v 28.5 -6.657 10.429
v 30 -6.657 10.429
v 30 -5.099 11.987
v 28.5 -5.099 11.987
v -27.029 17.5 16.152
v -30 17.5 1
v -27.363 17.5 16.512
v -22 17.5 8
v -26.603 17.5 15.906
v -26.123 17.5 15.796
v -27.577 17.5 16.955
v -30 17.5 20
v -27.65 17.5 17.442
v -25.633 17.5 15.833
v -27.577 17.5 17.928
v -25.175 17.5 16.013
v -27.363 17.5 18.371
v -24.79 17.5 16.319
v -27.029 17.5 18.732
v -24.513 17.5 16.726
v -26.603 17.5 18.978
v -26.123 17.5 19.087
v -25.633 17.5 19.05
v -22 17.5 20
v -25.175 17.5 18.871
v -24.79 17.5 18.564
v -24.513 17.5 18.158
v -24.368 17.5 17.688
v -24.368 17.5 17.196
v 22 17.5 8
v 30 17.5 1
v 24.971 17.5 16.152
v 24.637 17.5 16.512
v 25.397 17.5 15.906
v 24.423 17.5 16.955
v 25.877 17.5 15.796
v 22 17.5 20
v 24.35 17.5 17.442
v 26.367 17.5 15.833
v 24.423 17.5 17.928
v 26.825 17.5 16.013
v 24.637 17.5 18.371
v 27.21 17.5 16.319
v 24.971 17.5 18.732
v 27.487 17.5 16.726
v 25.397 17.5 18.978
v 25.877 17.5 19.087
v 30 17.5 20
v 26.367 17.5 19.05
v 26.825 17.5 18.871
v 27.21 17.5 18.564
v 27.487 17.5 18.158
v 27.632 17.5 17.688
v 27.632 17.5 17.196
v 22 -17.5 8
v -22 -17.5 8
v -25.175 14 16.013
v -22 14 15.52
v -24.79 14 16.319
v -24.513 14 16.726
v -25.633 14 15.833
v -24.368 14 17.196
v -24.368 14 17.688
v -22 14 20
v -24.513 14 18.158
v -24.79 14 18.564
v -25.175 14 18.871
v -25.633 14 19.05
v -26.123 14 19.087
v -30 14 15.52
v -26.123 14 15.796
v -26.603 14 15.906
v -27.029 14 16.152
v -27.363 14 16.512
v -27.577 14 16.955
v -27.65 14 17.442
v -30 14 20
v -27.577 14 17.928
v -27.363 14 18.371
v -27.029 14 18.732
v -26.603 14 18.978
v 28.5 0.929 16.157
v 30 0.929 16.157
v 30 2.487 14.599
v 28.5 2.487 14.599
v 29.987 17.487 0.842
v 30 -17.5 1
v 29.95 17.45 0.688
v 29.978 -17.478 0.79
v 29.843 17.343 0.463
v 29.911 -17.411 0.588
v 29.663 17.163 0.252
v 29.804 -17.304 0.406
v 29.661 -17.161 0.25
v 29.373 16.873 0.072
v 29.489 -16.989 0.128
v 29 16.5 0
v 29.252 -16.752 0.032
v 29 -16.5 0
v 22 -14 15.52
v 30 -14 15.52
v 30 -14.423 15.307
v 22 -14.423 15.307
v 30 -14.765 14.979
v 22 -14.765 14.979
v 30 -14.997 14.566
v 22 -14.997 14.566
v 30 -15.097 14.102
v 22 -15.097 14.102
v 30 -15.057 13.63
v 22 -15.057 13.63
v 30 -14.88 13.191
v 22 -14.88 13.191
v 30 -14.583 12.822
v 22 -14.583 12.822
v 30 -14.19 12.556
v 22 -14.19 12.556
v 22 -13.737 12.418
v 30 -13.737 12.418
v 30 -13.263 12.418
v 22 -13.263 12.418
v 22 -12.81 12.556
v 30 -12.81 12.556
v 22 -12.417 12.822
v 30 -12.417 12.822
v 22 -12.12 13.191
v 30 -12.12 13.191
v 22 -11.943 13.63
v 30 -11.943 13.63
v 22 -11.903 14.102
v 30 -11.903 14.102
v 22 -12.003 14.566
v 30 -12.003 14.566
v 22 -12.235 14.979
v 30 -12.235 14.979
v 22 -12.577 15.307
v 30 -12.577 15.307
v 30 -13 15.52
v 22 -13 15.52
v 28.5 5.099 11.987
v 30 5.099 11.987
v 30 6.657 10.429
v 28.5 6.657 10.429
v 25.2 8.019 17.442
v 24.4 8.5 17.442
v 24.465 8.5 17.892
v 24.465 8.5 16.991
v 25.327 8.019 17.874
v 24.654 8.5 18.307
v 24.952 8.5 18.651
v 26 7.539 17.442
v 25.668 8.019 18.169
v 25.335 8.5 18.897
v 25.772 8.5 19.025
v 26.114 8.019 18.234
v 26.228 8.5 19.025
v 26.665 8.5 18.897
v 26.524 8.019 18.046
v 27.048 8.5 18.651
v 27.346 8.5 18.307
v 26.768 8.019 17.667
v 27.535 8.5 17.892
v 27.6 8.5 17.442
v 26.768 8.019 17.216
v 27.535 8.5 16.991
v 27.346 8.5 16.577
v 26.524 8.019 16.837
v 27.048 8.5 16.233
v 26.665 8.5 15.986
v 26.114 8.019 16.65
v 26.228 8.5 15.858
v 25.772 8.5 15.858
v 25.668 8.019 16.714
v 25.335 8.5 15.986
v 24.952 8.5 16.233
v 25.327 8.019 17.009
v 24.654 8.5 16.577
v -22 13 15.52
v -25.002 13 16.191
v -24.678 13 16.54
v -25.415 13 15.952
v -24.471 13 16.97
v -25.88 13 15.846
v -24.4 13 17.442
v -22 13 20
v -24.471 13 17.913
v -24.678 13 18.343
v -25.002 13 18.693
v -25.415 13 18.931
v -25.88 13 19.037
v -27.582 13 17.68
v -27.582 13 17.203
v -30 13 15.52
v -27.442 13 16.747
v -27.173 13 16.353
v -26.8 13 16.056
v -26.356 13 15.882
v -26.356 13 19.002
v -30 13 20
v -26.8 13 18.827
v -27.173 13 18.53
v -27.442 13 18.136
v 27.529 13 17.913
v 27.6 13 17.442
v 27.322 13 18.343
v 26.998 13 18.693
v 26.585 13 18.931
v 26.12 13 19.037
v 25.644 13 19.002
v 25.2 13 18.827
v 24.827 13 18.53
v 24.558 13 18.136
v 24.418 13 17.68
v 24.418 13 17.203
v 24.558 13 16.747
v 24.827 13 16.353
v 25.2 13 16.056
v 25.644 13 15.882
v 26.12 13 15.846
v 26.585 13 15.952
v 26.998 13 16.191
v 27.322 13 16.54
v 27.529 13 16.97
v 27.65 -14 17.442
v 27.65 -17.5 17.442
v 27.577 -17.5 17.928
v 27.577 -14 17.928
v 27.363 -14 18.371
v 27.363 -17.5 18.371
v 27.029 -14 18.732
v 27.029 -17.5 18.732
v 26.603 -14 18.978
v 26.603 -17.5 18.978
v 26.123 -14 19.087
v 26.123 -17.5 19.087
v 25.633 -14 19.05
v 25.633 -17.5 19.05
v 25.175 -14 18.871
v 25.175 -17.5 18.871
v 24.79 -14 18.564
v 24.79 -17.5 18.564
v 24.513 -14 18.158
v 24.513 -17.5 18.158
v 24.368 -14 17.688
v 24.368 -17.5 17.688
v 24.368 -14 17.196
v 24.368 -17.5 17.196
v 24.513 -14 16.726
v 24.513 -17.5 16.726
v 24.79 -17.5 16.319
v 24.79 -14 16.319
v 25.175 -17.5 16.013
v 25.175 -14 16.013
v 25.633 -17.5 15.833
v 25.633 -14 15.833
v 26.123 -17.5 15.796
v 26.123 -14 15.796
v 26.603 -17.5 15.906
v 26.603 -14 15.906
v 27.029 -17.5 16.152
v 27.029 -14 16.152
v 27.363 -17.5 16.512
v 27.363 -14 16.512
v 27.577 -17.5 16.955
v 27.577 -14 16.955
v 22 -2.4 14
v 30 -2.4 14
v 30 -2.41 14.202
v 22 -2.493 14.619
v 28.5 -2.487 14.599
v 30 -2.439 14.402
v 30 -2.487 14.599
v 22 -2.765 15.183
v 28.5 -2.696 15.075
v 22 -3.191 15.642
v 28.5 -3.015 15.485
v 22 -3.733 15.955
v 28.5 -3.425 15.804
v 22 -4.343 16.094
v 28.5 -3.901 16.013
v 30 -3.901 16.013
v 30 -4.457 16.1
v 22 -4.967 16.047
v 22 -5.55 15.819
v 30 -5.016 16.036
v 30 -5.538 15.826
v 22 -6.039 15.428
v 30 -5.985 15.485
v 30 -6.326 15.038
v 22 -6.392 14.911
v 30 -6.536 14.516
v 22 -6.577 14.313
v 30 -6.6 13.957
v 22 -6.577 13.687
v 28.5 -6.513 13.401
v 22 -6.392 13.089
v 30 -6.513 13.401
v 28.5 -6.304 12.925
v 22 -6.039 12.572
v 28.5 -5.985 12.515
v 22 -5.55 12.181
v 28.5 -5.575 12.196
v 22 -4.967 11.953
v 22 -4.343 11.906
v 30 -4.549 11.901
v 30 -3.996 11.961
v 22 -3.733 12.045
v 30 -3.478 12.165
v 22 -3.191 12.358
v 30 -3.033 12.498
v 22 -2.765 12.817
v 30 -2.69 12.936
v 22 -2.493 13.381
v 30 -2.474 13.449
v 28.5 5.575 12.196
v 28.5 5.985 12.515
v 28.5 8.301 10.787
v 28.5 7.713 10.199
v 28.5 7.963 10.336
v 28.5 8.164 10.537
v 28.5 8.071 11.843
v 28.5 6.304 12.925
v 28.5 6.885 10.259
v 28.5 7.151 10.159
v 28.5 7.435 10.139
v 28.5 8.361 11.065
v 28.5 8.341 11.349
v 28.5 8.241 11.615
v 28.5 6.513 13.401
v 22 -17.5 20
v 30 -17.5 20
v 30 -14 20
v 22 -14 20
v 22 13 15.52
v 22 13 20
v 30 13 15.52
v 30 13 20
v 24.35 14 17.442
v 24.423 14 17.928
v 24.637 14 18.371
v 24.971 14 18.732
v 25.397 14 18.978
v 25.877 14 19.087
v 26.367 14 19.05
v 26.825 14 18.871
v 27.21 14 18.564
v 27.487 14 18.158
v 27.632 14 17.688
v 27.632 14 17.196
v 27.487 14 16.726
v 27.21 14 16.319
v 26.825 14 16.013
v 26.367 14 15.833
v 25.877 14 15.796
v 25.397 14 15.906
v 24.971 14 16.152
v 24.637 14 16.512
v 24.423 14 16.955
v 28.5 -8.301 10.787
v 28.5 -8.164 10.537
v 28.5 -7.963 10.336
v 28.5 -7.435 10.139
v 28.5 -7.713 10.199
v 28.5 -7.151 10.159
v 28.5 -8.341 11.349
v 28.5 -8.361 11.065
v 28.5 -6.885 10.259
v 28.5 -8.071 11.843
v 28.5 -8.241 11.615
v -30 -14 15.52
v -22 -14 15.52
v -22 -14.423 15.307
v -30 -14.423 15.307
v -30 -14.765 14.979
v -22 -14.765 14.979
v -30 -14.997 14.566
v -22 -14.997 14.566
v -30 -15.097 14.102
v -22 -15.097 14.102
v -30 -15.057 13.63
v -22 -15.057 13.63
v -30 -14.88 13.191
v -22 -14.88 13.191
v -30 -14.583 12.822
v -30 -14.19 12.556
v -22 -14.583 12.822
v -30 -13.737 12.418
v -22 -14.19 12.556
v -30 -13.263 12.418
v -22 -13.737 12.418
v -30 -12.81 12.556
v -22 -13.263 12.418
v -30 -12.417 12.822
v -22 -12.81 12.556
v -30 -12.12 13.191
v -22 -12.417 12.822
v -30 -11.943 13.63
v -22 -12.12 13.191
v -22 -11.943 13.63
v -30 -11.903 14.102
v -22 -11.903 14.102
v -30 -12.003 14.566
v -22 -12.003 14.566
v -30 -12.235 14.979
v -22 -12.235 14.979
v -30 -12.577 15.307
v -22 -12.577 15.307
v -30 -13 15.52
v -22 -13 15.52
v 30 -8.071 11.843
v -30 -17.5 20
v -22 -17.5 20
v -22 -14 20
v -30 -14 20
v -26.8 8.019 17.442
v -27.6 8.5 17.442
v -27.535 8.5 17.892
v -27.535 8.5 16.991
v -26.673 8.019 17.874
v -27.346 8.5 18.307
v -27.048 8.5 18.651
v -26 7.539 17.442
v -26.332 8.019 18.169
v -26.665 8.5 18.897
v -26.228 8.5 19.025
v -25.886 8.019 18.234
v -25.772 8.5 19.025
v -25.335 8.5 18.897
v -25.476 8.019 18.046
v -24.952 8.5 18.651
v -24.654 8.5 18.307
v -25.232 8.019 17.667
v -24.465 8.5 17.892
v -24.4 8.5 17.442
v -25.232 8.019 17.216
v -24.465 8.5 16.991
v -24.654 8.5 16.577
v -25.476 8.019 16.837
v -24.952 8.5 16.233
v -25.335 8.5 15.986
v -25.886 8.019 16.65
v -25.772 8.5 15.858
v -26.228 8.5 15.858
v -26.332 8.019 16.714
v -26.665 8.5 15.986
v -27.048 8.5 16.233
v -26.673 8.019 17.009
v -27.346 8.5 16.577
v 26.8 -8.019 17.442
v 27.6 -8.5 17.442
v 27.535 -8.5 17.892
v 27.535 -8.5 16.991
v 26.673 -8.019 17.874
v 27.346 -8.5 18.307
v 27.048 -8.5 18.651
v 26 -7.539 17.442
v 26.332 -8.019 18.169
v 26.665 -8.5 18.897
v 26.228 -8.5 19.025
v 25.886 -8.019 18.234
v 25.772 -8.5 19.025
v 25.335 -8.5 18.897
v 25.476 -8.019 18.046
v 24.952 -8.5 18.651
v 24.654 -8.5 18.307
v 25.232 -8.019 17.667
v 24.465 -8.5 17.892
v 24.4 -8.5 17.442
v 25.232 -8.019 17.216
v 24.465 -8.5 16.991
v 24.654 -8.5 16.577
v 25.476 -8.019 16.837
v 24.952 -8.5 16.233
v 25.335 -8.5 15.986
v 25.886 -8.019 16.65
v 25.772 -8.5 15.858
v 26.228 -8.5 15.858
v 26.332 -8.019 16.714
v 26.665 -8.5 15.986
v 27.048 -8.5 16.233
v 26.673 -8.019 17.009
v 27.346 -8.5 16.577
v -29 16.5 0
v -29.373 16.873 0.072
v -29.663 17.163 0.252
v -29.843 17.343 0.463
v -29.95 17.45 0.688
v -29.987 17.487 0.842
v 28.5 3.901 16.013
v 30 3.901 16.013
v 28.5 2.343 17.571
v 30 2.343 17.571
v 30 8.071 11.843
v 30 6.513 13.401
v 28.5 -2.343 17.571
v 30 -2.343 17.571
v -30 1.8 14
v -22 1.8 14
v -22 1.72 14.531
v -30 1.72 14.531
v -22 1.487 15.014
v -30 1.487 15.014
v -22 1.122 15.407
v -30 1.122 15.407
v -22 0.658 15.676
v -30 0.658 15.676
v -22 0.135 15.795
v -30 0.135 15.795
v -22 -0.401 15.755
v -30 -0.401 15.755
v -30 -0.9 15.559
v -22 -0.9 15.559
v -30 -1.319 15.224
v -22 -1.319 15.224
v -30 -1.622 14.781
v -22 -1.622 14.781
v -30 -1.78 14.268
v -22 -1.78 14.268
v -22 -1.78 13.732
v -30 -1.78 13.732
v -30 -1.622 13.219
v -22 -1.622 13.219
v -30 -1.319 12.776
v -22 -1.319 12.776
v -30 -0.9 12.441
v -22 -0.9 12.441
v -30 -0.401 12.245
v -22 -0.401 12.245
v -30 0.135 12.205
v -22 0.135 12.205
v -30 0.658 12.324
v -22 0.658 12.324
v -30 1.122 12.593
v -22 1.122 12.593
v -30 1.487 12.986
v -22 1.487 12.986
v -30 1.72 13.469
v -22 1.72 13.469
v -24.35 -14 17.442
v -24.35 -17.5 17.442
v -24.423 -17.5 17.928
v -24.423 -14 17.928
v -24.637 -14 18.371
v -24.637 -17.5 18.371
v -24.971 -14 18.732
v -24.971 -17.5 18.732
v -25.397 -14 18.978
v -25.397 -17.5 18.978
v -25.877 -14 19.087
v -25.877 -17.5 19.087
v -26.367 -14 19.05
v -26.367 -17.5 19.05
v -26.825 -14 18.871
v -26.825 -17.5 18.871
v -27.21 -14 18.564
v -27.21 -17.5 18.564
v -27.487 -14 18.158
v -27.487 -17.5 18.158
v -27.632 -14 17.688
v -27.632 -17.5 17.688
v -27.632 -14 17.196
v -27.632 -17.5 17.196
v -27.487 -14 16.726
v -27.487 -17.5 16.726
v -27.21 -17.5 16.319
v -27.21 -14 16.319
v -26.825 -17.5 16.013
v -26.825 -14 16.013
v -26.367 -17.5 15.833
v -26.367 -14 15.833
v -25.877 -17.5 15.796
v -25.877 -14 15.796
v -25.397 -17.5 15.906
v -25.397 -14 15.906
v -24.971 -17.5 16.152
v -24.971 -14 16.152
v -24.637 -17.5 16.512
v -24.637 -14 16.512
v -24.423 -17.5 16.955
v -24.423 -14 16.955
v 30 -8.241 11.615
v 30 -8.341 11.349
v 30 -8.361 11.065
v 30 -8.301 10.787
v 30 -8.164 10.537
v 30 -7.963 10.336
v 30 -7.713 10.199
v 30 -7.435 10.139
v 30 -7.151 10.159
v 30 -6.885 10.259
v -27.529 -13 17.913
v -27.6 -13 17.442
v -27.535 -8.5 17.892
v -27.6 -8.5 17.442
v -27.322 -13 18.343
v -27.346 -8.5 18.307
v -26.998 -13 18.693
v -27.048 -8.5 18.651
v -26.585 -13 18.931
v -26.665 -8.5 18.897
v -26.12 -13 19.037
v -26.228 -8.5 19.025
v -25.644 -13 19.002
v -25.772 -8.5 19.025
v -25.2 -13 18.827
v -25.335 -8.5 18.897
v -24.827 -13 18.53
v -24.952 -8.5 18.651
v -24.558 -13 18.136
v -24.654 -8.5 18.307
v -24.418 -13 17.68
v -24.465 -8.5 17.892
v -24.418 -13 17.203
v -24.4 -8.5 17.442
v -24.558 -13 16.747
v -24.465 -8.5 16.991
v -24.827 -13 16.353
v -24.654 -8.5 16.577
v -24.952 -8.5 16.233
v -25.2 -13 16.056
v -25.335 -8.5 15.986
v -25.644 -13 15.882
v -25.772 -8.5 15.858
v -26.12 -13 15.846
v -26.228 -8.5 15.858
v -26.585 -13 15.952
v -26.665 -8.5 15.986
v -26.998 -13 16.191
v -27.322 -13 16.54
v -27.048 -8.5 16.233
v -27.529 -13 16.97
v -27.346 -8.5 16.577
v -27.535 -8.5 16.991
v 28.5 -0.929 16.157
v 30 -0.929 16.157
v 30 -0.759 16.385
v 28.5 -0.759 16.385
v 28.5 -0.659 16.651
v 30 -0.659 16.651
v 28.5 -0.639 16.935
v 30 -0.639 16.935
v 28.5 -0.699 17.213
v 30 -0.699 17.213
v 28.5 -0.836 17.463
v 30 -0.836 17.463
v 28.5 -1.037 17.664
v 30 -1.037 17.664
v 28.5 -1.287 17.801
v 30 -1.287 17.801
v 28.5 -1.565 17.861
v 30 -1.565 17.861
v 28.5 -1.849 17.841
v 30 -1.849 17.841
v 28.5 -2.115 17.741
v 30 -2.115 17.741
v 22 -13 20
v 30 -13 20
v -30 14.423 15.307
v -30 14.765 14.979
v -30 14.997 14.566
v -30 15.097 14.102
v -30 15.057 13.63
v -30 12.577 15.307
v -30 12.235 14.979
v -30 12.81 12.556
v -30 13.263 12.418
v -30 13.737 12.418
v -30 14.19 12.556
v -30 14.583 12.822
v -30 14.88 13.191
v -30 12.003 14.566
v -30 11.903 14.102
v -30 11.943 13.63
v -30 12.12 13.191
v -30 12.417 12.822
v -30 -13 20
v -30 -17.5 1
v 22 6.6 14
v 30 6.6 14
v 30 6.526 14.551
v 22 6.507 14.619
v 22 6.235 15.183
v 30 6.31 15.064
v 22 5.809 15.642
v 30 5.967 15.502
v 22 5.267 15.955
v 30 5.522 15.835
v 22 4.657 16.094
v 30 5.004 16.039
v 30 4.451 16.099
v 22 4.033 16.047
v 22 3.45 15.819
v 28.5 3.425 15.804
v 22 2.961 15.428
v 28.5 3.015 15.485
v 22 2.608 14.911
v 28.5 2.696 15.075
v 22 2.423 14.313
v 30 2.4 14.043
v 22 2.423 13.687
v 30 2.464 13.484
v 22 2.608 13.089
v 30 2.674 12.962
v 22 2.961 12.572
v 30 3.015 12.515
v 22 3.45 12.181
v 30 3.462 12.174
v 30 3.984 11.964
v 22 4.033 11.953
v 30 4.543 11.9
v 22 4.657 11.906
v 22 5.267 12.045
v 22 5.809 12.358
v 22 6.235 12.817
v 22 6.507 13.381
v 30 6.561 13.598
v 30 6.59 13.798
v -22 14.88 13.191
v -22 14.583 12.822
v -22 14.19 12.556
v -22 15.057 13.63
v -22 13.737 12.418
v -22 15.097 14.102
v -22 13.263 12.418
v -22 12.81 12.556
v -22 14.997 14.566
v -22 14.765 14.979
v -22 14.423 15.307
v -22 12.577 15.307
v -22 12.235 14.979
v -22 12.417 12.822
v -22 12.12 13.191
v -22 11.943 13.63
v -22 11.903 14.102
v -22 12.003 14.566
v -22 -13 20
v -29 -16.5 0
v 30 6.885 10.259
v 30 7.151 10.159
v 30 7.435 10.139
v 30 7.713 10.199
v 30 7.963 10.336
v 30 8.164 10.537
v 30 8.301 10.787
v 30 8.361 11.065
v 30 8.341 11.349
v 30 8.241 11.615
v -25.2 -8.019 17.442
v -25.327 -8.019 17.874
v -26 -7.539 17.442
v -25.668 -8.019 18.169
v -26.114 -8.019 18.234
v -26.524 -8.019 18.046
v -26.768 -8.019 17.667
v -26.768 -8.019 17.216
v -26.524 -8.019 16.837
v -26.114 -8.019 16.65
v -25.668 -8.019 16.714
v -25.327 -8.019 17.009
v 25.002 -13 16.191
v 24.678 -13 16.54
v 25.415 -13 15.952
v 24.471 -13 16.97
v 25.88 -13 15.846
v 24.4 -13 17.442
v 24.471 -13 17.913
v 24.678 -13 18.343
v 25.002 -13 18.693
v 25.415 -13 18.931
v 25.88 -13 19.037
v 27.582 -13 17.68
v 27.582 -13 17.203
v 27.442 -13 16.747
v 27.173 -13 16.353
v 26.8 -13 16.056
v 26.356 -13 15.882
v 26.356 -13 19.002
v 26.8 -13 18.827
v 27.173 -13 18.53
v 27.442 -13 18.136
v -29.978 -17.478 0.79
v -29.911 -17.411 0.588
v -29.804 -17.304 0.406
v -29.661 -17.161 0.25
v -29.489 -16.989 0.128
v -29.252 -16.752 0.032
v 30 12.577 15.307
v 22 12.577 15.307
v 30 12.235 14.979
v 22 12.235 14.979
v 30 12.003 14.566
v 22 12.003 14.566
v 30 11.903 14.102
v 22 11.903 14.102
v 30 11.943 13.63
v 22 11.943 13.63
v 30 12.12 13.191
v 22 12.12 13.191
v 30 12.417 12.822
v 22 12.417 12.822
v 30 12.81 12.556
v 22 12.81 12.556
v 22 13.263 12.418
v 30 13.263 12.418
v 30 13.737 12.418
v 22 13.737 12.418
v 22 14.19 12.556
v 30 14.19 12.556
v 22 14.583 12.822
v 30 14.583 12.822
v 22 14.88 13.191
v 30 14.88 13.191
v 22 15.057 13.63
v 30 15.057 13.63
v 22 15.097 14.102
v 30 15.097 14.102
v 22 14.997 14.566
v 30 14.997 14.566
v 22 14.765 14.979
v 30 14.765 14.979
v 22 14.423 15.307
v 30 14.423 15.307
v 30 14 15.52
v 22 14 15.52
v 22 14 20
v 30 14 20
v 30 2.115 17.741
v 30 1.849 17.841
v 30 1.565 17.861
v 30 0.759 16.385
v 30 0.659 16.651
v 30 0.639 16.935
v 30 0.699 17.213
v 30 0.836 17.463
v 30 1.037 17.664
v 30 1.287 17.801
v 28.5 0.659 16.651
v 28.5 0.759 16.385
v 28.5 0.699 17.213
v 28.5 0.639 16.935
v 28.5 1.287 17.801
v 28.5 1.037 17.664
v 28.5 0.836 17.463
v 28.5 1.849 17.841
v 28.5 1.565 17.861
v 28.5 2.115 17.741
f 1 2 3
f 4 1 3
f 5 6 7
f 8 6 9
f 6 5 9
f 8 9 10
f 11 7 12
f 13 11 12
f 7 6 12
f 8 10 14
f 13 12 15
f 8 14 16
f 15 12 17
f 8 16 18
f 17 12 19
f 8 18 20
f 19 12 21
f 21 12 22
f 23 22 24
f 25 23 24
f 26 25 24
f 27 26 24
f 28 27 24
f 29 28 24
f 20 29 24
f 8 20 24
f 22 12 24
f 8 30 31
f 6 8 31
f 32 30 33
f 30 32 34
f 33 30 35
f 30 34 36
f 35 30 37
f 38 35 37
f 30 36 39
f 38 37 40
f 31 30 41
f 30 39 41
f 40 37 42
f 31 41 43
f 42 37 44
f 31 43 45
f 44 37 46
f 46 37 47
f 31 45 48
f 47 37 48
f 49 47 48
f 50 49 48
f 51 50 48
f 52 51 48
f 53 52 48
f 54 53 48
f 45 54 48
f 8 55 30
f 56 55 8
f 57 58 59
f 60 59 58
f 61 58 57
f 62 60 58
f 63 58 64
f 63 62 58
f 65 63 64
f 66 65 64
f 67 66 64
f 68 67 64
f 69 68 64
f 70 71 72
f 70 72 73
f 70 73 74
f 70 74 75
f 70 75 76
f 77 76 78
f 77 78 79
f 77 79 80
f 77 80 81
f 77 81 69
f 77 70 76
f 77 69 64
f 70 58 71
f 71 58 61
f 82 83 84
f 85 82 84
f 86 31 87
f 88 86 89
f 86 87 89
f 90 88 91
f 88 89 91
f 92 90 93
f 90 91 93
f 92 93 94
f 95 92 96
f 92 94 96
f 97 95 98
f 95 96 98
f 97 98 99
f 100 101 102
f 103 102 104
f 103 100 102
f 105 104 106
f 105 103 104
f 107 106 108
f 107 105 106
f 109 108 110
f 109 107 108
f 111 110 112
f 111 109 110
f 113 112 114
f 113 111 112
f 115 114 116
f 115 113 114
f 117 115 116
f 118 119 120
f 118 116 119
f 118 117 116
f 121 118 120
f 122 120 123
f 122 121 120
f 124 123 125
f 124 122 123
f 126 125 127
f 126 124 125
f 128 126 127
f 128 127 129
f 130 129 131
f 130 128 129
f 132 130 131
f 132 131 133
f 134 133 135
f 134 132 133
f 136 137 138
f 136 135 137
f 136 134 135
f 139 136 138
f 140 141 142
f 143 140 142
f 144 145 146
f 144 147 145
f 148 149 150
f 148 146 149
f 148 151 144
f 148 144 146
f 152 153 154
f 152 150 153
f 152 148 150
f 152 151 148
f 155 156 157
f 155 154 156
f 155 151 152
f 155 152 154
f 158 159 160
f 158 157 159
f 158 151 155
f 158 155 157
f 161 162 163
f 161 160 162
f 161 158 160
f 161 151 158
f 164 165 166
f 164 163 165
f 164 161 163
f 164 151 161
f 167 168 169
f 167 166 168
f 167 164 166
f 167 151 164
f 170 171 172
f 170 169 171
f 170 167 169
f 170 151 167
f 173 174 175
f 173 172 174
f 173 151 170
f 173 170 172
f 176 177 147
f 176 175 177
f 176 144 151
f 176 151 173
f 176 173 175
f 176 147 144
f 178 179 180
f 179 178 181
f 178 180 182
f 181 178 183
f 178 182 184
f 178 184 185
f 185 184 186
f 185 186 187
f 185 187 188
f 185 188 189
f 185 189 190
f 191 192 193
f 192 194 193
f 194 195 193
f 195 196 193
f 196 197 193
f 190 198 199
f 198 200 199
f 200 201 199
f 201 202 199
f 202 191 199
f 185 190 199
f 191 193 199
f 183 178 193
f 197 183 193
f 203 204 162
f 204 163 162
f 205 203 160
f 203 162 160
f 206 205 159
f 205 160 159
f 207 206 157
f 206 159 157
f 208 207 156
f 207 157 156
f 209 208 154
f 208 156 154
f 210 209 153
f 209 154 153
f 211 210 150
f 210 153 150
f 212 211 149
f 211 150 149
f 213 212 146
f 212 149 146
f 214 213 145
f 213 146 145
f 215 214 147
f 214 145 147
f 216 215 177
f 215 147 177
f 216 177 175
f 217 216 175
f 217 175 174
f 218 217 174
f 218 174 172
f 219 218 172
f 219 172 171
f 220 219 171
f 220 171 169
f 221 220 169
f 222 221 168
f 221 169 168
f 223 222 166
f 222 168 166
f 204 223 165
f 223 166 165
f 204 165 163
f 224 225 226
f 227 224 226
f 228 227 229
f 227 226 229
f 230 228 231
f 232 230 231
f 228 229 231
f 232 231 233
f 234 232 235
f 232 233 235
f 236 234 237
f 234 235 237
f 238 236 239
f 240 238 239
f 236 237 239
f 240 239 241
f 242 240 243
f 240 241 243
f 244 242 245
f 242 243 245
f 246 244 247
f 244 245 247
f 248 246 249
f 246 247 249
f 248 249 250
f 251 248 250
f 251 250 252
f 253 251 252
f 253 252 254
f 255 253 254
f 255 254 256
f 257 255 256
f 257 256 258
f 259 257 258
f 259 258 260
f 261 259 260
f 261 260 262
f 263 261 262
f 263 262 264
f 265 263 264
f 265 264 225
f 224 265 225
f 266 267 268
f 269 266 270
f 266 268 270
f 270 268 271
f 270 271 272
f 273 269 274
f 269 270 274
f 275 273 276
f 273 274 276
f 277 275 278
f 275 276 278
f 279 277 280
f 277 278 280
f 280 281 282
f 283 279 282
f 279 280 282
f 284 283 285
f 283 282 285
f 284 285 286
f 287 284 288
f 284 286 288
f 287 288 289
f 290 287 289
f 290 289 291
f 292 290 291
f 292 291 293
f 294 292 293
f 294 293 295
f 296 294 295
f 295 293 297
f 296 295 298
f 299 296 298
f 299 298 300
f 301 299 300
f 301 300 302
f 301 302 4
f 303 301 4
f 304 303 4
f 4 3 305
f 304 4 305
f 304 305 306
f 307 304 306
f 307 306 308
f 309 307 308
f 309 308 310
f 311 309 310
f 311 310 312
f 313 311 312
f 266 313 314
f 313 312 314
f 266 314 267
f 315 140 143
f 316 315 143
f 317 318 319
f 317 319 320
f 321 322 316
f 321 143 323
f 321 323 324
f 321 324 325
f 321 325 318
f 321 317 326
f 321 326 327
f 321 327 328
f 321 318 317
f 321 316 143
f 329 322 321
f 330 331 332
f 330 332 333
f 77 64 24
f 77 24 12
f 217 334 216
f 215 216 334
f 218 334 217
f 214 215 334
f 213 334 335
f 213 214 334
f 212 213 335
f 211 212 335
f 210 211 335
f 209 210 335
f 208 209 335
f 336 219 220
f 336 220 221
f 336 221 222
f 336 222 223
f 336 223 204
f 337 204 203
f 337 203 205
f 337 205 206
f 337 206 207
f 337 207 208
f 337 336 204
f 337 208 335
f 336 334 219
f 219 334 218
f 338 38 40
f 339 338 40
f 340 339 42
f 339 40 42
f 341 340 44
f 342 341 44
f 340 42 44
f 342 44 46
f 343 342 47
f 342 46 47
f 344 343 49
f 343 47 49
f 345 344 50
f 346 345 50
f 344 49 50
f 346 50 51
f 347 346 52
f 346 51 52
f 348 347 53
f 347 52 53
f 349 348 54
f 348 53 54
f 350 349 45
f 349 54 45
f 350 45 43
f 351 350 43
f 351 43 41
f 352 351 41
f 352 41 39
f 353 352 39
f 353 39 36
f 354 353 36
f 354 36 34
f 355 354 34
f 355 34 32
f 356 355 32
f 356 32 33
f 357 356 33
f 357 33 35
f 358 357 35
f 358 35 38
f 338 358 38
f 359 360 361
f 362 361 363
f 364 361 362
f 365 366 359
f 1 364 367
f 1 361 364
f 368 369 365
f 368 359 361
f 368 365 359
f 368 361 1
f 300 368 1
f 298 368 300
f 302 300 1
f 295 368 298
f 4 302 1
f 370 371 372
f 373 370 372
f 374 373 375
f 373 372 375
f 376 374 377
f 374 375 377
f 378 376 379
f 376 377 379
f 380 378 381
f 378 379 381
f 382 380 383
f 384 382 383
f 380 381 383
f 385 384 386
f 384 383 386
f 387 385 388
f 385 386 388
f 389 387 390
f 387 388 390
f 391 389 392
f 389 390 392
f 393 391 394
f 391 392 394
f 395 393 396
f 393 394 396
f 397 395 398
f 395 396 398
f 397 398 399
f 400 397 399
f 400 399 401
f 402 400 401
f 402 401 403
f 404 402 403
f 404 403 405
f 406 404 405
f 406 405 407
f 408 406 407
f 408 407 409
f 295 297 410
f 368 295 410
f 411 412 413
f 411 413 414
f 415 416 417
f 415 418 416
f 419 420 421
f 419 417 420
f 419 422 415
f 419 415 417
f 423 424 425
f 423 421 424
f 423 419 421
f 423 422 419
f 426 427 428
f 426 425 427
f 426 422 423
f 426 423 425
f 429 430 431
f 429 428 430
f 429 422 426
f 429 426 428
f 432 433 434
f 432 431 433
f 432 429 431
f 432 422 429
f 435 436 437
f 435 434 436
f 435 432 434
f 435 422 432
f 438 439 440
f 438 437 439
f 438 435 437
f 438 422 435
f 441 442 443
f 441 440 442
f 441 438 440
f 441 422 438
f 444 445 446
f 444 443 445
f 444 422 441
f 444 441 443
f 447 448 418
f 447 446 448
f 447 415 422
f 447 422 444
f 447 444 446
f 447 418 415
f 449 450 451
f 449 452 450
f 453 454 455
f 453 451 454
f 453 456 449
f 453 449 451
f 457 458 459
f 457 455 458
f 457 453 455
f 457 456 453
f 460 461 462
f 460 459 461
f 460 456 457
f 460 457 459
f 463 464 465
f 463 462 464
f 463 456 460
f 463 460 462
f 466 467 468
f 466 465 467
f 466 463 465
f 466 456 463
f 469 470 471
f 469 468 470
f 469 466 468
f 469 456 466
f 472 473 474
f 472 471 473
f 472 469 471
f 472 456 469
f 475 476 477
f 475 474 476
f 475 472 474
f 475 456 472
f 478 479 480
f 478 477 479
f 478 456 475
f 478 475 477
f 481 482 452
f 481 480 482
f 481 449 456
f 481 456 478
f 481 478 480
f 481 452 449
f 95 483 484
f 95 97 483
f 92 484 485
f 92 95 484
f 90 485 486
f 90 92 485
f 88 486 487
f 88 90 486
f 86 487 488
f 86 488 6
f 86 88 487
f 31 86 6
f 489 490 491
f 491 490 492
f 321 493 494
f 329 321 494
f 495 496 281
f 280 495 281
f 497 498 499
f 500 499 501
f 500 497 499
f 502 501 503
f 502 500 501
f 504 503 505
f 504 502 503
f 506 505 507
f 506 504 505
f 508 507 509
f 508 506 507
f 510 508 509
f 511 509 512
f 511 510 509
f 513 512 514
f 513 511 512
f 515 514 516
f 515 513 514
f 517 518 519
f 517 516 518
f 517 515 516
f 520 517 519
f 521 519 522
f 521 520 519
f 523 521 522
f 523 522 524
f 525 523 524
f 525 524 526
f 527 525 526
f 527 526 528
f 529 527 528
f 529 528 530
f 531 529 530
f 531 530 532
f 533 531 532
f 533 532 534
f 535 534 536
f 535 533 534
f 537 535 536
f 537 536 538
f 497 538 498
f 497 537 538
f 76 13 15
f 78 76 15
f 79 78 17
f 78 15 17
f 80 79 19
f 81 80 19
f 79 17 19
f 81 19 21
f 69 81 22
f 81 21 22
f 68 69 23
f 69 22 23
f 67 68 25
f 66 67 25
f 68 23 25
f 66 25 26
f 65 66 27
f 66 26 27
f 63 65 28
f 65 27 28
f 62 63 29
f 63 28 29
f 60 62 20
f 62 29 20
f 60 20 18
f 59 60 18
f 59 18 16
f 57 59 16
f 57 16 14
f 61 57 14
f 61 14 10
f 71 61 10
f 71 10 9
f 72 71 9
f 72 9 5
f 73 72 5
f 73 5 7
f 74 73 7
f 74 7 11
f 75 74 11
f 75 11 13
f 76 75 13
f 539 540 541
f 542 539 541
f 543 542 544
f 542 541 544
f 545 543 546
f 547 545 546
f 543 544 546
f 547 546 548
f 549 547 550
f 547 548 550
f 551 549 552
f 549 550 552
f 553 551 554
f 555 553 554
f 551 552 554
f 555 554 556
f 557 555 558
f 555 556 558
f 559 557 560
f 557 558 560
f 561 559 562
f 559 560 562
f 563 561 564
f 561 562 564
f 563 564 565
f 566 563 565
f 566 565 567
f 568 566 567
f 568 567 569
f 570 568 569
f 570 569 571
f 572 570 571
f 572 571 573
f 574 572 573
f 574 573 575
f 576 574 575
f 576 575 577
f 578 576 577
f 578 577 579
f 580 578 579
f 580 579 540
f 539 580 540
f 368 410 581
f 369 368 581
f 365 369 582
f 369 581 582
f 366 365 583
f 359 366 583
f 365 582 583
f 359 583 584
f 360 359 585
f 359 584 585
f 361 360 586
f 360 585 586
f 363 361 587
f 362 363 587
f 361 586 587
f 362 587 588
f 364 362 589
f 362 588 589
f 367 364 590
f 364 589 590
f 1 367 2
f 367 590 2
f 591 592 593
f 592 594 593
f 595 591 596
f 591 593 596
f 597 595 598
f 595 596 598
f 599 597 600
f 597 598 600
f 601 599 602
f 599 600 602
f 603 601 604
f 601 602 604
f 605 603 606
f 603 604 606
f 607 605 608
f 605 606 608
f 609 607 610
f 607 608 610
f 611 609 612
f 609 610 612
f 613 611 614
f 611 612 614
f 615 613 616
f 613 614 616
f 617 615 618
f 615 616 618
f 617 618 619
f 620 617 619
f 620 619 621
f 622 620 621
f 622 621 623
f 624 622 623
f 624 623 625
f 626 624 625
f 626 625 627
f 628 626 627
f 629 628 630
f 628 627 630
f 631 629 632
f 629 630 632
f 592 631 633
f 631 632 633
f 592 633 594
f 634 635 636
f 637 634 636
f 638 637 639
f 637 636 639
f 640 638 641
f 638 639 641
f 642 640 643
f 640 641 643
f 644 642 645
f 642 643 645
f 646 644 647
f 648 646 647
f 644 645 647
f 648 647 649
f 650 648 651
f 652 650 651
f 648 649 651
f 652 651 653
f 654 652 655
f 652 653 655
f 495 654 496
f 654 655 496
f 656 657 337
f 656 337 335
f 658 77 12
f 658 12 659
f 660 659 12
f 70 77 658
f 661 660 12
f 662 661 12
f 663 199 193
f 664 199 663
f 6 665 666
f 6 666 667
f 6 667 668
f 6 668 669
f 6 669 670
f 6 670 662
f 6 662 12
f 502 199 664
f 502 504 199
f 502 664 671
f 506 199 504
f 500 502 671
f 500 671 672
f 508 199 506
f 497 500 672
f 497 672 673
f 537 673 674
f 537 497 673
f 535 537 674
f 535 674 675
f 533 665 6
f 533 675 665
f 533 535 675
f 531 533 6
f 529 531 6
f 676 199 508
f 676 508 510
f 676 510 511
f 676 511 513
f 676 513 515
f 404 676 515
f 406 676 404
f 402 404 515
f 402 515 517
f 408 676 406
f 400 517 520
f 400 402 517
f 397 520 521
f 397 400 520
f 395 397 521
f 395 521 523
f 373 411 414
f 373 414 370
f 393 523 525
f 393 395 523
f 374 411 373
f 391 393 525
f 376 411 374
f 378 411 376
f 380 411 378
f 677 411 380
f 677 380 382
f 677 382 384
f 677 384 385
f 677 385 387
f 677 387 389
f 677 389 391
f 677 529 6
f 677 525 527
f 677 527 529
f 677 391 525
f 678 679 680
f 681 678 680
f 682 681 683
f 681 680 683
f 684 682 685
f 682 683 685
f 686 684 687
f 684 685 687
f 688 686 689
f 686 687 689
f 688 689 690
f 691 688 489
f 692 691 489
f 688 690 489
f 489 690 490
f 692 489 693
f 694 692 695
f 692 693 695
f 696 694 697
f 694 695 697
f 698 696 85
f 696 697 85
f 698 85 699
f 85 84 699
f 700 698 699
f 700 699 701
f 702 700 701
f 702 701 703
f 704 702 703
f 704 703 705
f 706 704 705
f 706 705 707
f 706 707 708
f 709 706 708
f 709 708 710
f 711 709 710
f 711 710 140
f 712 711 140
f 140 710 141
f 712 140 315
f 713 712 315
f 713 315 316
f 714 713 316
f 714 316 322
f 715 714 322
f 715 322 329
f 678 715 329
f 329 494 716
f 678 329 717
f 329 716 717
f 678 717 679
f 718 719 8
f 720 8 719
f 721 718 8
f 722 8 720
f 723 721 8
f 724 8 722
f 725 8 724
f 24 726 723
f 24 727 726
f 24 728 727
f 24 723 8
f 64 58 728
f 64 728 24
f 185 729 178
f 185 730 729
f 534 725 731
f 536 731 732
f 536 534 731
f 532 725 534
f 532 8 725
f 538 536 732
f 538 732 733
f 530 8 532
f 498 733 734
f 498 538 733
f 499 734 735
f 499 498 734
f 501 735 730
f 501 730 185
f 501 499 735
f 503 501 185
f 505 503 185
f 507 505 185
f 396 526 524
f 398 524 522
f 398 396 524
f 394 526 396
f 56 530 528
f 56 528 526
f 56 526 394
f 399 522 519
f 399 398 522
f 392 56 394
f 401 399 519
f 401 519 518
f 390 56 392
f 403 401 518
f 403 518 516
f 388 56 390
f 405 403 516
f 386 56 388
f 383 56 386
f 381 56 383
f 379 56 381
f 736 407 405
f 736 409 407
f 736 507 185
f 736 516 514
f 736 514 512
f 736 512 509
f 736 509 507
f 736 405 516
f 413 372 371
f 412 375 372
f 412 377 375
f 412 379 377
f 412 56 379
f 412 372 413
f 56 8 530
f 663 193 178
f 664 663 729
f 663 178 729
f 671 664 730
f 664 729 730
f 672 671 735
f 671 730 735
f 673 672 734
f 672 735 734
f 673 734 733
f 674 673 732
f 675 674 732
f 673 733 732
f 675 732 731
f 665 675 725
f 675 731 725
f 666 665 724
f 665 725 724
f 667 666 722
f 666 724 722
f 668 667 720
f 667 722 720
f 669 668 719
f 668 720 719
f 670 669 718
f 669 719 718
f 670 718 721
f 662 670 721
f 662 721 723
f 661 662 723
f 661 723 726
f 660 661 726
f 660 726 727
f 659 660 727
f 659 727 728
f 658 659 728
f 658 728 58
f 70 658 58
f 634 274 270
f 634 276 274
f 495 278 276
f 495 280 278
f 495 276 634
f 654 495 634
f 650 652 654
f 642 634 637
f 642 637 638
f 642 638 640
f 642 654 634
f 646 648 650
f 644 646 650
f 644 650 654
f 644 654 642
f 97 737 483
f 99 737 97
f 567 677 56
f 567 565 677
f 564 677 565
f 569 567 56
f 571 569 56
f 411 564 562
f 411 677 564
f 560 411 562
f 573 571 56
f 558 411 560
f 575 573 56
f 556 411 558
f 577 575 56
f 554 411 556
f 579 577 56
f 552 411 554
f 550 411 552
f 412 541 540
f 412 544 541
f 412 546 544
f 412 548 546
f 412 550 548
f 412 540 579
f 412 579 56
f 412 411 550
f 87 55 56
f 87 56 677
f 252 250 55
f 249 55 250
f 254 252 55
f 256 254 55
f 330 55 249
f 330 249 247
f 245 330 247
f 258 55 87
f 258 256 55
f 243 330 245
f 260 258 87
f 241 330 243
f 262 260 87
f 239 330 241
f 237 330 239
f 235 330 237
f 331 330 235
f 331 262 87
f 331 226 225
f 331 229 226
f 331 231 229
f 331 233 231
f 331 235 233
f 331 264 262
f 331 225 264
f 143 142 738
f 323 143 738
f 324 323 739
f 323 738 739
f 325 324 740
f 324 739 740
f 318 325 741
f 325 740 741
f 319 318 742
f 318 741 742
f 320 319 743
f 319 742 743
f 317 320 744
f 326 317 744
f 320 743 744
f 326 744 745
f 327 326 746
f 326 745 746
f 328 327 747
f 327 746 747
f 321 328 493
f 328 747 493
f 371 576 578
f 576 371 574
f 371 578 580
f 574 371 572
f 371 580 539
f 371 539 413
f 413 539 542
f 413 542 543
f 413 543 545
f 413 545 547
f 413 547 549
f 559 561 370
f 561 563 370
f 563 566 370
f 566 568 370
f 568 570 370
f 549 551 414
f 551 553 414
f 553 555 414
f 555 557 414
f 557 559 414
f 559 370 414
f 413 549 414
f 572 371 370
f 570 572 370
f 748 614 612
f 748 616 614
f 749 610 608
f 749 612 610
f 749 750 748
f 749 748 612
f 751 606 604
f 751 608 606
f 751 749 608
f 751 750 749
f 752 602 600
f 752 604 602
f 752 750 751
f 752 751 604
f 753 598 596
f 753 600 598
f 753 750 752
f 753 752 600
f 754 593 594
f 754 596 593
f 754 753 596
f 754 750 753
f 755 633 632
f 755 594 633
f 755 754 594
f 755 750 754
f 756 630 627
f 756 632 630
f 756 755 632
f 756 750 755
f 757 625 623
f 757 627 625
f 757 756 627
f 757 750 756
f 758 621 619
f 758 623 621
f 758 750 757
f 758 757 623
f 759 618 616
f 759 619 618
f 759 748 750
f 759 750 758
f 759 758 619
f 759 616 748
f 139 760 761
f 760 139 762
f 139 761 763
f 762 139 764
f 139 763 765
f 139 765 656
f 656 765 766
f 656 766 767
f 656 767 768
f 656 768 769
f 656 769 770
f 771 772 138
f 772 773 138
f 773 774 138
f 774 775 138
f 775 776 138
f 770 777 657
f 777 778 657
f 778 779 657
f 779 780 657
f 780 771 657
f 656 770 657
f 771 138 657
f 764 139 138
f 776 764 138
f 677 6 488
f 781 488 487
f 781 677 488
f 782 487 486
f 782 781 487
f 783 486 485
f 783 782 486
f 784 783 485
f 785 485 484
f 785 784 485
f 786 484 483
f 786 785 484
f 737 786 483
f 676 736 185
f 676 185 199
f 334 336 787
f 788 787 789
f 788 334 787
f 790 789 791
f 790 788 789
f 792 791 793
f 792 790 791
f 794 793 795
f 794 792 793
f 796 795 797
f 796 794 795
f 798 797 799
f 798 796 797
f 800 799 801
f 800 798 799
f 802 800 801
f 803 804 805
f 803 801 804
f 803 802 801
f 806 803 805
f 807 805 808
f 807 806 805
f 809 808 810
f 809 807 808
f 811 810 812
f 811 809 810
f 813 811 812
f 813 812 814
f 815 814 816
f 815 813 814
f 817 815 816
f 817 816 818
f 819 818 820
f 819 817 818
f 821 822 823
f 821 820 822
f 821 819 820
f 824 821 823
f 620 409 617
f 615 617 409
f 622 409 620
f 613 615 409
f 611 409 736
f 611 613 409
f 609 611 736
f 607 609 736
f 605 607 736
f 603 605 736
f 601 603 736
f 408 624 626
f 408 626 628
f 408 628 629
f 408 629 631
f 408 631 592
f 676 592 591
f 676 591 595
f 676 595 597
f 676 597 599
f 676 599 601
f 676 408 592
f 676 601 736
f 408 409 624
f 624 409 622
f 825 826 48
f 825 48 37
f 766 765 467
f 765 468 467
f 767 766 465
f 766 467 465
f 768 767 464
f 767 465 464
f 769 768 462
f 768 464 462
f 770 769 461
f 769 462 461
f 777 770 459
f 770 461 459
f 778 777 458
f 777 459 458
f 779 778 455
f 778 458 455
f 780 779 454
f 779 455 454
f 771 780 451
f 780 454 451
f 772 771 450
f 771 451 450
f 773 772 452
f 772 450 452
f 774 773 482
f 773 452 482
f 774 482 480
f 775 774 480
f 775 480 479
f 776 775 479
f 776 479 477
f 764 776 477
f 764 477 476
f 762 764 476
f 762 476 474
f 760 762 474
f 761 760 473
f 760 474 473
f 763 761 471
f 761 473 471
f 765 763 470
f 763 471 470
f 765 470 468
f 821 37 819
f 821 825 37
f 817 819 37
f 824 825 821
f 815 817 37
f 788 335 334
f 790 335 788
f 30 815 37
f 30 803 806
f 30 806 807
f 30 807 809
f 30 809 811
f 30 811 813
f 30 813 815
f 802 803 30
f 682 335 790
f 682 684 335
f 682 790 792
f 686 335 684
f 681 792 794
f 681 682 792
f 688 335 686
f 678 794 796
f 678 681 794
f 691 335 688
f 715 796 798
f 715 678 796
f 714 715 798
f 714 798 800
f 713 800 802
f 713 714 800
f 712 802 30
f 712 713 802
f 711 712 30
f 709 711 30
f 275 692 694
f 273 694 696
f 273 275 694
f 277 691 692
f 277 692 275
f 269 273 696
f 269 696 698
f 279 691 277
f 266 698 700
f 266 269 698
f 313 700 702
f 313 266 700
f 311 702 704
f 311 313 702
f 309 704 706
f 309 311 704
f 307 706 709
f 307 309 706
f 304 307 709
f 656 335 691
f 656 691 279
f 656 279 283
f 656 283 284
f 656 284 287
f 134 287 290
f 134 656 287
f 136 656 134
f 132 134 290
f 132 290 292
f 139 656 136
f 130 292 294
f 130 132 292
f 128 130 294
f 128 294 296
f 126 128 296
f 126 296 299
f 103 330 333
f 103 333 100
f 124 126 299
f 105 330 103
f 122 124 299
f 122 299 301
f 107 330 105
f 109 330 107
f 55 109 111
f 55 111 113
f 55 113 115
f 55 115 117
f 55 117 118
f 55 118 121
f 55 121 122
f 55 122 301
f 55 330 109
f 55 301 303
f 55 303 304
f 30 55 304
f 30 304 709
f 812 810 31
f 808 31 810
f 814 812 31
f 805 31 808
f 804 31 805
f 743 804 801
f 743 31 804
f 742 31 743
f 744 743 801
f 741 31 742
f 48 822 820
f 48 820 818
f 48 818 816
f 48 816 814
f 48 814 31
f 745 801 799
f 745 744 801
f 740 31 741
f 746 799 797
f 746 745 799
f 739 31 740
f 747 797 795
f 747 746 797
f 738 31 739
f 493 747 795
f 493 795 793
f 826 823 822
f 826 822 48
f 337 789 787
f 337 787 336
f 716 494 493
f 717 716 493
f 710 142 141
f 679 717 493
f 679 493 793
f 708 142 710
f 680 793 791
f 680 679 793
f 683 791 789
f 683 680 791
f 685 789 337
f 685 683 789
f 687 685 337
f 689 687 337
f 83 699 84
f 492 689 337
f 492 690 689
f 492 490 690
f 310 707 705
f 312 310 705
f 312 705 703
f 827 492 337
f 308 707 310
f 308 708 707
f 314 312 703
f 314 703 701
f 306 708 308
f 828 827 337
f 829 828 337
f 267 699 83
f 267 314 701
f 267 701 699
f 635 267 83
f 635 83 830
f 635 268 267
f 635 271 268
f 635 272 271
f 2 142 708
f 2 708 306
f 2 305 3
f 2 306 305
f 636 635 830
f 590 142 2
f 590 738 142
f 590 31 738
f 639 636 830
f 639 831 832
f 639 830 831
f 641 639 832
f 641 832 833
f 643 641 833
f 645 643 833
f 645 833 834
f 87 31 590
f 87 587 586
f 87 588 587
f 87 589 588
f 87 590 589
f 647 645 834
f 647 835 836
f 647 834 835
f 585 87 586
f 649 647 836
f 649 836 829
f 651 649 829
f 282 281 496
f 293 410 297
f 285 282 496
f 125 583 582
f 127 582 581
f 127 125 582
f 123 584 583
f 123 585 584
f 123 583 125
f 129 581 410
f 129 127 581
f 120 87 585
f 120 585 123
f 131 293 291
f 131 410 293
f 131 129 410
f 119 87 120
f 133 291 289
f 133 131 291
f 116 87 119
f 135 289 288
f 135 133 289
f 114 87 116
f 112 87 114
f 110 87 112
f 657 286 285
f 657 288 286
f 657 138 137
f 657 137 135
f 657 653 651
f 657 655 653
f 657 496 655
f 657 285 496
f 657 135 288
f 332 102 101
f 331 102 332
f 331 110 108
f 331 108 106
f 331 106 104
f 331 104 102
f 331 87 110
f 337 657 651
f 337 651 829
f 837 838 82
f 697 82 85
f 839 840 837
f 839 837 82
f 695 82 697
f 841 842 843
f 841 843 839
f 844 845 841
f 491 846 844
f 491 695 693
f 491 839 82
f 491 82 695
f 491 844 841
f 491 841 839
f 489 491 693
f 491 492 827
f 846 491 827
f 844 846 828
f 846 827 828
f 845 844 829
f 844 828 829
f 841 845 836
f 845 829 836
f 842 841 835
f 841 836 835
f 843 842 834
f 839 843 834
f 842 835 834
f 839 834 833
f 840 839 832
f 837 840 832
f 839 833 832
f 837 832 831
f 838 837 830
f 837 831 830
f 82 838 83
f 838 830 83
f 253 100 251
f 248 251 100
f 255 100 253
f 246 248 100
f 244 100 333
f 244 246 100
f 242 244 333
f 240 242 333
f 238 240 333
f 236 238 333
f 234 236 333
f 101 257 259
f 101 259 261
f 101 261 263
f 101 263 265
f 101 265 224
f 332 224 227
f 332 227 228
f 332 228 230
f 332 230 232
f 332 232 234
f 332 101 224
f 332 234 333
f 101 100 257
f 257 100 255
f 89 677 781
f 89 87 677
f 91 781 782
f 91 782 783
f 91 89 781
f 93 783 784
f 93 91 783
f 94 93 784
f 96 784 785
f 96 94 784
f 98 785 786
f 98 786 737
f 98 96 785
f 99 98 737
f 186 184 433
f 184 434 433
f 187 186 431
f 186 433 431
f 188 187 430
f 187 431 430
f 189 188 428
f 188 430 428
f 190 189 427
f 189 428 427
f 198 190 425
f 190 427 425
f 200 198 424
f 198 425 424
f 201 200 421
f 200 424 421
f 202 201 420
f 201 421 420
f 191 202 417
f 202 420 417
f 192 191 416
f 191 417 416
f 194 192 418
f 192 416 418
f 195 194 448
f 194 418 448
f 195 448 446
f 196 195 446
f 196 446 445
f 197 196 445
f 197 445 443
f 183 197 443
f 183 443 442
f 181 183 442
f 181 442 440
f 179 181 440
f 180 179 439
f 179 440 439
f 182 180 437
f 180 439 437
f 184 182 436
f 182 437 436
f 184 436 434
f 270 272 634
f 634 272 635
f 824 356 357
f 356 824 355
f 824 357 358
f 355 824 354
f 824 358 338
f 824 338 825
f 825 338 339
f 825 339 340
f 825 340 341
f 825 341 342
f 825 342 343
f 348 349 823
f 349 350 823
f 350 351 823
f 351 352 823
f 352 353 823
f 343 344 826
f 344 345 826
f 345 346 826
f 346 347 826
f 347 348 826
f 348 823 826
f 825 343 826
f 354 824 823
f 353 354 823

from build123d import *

# Parameters (mm, degrees)
PAD_DEPTH           = 17.5
SKETCH001_R         = 1.6
POCKET_DEPTH        = 30.001
POCKET_DEPTH_BACK   = 30.001
SKETCH009_R         = 2.1
POCKET002_DEPTH     = 10
POCKET006_DEPTH     = 1.5
SKETCH014_R         = 1.8
HOLE_DEPTH          = 10
HOLE001_D           = 3.2
HOLE001_DEPTH       = 9
HOLE001_CBORE_D     = 3.3
HOLE001_CBORE_DEPTH = 3.5
HOLE001_TIPS_R      = 1.6
HOLE002_D           = 3.2
HOLE002_DEPTH       = 9
HOLE002_CBORE_D     = 3.3
HOLE002_CBORE_DEPTH = 3.5
HOLE002_TIPS_R      = 1.6
SKETCH018_W         = 1
SKETCH018_H         = 7.240904
SKETCH018_H_2       = 8.067387
POCKET009_DEPTH     = 10
SKETCH019_W         = 1
SKETCH019_H         = 13.038261
SKETCH019_H_2       = 12.983065
POCKET010_DEPTH     = 10
FILLET_R            = 1


with BuildPart() as part:
    # Sketch → Pad (new body, symmetric)
    with BuildSketch(Plane.XZ):
        Polygon((-30, 20), (-30, 0), (30, 0), (30, 20), (22, 20), (22, 8), (-22, 8), (-22, 20), align=None)
    extrude(amount=PAD_DEPTH, both=True)

    # Sketch001 → Pocket (cut, two sides)
    with BuildSketch(Plane.YZ) as pocket_sk:
        with Locations((-13.5, 14)):
            Circle(SKETCH001_R)
        with Locations((13.5, 14)):
            Circle(SKETCH001_R)
    extrude(amount=-POCKET_DEPTH, mode=Mode.SUBTRACT)
    extrude(pocket_sk.sketch, amount=POCKET_DEPTH_BACK, mode=Mode.SUBTRACT)

    # Sketch009 (on DatumPlane) → Pocket002 (cut)
    with BuildSketch(Plane.YZ.offset(30)):
        with Locations((-4.5, 14)):
            Circle(SKETCH009_R)
        with Locations((4.5, 14)):
            Circle(SKETCH009_R)
    extrude(amount=-POCKET002_DEPTH, mode=Mode.SUBTRACT)

    # Sketch013 (on DatumPlane) → Pocket006 (cut)
    with BuildSketch(Plane.YZ.offset(30)):
        with BuildLine():
            ThreePointArc((-0.929111, 16.156676), (-0.929111, 17.570889), (-2.343324, 17.570889))
            Line((-2.343324, 17.570889), (-8.070889, 11.843324))
            ThreePointArc((-8.070889, 11.843324), (-8.070889, 10.429111), (-6.656676, 10.429111))
            Line((-6.656676, 10.429111), (-0.929111, 16.156676))
        make_face()
        with BuildLine():
            ThreePointArc((2.343324, 17.570889), (0.929111, 17.570889), (0.929111, 16.156676))
            Line((0.929111, 16.156676), (6.656676, 10.429111))
            ThreePointArc((6.656676, 10.429111), (8.070889, 10.429111), (8.070889, 11.843324))
            Line((8.070889, 11.843324), (2.343324, 17.570889))
        make_face()
    extrude(amount=-POCKET006_DEPTH, mode=Mode.SUBTRACT)

    # Sketch014 (on DatumPlane) → Hole (cut)
    with BuildSketch(Plane.YZ.offset(-30)):
        with Locations((0, 14)):
            Circle(SKETCH014_R)
    extrude(amount=HOLE_DEPTH, mode=Mode.SUBTRACT)

    # Hole001
    with Locations(Plane.XZ.offset(17.5)):
        with Locations((26, 17.441701), (-26, 17.441701)):
            CounterBoreHole(HOLE001_D / 2, HOLE001_CBORE_D / 2, HOLE001_CBORE_DEPTH, depth=HOLE001_DEPTH)

    # Hole001 tips → Hole001 tip 1 section 0
    with BuildSketch(Plane.XZ.offset(8.5), mode=Mode.PRIVATE) as hole001_tip_1_s0:
        with Locations((26, 17.441701)):
            Circle(HOLE001_TIPS_R)
    loft([hole001_tip_1_s0.sketch, Vertex(26, -7.538623, 17.441701)], mode=Mode.SUBTRACT)

    # Hole001 tips → Hole001 tip 2 section 0
    with BuildSketch(Plane.XZ.offset(8.5), mode=Mode.PRIVATE) as hole001_tip_2_s0:
        with Locations((-26, 17.441701)):
            Circle(HOLE001_TIPS_R)
    loft([hole001_tip_2_s0.sketch, Vertex(-26, -7.538623, 17.441701)], mode=Mode.SUBTRACT)

    # Hole002
    with Locations(Plane(origin=(0, 17.5, 0), x_dir=(-1, 0, 0), z_dir=(0, 1, 0))):
        with Locations((-26, 17.441701), (26, 17.441701)):
            CounterBoreHole(HOLE002_D / 2, HOLE002_CBORE_D / 2, HOLE002_CBORE_DEPTH, depth=HOLE002_DEPTH)

    # Hole002 tips → Hole002 tip 1 section 0
    with BuildSketch(Plane(origin=(0, 8.5, 0), x_dir=(-1, 0, 0), z_dir=(0, 1, 0)), mode=Mode.PRIVATE) as hole002_tip_1_s0:
        with Locations((-26, 17.441701)):
            Circle(HOLE002_TIPS_R)
    loft([hole002_tip_1_s0.sketch, Vertex(26, 7.538623, 17.441701)], mode=Mode.SUBTRACT)

    # Hole002 tips → Hole002 tip 2 section 0
    with BuildSketch(Plane(origin=(0, 8.5, 0), x_dir=(-1, 0, 0), z_dir=(0, 1, 0)), mode=Mode.PRIVATE) as hole002_tip_2_s0:
        with Locations((26, 17.441701)):
            Circle(HOLE002_TIPS_R)
    loft([hole002_tip_2_s0.sketch, Vertex(-26, 7.538623, 17.441701)], mode=Mode.SUBTRACT)

    # Sketch018 (on DatumPlane) → Pocket009 (cut)
    with BuildSketch(Plane.YZ.offset(-30)):
        with Locations((-13.5, 17.620452)):
            Rectangle(SKETCH018_W, SKETCH018_H)
        with Locations((13.5, 18.033693)):
            Rectangle(SKETCH018_W, SKETCH018_H_2)
    extrude(amount=POCKET009_DEPTH, mode=Mode.SUBTRACT)

    # Sketch019 (on DatumPlane) → Pocket010 (cut)
    with BuildSketch(Plane.YZ.offset(30)):
        with Locations((-13.5, 20.51913)):
            Rectangle(SKETCH019_W, SKETCH019_H)
        with Locations((13.5, 20.491532)):
            Rectangle(SKETCH019_W, SKETCH019_H_2)
    extrude(amount=-POCKET010_DEPTH, mode=Mode.SUBTRACT)

    # Fillet
    fillet_edges = [part.edges().sort_by_distance(p)[0] for p in [
        (0, 17.5, 0),
        (-30, 0, 0),
        (0, -17.5, 0),
        (30, 0, 0),
    ]]
    fillet(fillet_edges, radius=FILLET_R)


solid = part.part
